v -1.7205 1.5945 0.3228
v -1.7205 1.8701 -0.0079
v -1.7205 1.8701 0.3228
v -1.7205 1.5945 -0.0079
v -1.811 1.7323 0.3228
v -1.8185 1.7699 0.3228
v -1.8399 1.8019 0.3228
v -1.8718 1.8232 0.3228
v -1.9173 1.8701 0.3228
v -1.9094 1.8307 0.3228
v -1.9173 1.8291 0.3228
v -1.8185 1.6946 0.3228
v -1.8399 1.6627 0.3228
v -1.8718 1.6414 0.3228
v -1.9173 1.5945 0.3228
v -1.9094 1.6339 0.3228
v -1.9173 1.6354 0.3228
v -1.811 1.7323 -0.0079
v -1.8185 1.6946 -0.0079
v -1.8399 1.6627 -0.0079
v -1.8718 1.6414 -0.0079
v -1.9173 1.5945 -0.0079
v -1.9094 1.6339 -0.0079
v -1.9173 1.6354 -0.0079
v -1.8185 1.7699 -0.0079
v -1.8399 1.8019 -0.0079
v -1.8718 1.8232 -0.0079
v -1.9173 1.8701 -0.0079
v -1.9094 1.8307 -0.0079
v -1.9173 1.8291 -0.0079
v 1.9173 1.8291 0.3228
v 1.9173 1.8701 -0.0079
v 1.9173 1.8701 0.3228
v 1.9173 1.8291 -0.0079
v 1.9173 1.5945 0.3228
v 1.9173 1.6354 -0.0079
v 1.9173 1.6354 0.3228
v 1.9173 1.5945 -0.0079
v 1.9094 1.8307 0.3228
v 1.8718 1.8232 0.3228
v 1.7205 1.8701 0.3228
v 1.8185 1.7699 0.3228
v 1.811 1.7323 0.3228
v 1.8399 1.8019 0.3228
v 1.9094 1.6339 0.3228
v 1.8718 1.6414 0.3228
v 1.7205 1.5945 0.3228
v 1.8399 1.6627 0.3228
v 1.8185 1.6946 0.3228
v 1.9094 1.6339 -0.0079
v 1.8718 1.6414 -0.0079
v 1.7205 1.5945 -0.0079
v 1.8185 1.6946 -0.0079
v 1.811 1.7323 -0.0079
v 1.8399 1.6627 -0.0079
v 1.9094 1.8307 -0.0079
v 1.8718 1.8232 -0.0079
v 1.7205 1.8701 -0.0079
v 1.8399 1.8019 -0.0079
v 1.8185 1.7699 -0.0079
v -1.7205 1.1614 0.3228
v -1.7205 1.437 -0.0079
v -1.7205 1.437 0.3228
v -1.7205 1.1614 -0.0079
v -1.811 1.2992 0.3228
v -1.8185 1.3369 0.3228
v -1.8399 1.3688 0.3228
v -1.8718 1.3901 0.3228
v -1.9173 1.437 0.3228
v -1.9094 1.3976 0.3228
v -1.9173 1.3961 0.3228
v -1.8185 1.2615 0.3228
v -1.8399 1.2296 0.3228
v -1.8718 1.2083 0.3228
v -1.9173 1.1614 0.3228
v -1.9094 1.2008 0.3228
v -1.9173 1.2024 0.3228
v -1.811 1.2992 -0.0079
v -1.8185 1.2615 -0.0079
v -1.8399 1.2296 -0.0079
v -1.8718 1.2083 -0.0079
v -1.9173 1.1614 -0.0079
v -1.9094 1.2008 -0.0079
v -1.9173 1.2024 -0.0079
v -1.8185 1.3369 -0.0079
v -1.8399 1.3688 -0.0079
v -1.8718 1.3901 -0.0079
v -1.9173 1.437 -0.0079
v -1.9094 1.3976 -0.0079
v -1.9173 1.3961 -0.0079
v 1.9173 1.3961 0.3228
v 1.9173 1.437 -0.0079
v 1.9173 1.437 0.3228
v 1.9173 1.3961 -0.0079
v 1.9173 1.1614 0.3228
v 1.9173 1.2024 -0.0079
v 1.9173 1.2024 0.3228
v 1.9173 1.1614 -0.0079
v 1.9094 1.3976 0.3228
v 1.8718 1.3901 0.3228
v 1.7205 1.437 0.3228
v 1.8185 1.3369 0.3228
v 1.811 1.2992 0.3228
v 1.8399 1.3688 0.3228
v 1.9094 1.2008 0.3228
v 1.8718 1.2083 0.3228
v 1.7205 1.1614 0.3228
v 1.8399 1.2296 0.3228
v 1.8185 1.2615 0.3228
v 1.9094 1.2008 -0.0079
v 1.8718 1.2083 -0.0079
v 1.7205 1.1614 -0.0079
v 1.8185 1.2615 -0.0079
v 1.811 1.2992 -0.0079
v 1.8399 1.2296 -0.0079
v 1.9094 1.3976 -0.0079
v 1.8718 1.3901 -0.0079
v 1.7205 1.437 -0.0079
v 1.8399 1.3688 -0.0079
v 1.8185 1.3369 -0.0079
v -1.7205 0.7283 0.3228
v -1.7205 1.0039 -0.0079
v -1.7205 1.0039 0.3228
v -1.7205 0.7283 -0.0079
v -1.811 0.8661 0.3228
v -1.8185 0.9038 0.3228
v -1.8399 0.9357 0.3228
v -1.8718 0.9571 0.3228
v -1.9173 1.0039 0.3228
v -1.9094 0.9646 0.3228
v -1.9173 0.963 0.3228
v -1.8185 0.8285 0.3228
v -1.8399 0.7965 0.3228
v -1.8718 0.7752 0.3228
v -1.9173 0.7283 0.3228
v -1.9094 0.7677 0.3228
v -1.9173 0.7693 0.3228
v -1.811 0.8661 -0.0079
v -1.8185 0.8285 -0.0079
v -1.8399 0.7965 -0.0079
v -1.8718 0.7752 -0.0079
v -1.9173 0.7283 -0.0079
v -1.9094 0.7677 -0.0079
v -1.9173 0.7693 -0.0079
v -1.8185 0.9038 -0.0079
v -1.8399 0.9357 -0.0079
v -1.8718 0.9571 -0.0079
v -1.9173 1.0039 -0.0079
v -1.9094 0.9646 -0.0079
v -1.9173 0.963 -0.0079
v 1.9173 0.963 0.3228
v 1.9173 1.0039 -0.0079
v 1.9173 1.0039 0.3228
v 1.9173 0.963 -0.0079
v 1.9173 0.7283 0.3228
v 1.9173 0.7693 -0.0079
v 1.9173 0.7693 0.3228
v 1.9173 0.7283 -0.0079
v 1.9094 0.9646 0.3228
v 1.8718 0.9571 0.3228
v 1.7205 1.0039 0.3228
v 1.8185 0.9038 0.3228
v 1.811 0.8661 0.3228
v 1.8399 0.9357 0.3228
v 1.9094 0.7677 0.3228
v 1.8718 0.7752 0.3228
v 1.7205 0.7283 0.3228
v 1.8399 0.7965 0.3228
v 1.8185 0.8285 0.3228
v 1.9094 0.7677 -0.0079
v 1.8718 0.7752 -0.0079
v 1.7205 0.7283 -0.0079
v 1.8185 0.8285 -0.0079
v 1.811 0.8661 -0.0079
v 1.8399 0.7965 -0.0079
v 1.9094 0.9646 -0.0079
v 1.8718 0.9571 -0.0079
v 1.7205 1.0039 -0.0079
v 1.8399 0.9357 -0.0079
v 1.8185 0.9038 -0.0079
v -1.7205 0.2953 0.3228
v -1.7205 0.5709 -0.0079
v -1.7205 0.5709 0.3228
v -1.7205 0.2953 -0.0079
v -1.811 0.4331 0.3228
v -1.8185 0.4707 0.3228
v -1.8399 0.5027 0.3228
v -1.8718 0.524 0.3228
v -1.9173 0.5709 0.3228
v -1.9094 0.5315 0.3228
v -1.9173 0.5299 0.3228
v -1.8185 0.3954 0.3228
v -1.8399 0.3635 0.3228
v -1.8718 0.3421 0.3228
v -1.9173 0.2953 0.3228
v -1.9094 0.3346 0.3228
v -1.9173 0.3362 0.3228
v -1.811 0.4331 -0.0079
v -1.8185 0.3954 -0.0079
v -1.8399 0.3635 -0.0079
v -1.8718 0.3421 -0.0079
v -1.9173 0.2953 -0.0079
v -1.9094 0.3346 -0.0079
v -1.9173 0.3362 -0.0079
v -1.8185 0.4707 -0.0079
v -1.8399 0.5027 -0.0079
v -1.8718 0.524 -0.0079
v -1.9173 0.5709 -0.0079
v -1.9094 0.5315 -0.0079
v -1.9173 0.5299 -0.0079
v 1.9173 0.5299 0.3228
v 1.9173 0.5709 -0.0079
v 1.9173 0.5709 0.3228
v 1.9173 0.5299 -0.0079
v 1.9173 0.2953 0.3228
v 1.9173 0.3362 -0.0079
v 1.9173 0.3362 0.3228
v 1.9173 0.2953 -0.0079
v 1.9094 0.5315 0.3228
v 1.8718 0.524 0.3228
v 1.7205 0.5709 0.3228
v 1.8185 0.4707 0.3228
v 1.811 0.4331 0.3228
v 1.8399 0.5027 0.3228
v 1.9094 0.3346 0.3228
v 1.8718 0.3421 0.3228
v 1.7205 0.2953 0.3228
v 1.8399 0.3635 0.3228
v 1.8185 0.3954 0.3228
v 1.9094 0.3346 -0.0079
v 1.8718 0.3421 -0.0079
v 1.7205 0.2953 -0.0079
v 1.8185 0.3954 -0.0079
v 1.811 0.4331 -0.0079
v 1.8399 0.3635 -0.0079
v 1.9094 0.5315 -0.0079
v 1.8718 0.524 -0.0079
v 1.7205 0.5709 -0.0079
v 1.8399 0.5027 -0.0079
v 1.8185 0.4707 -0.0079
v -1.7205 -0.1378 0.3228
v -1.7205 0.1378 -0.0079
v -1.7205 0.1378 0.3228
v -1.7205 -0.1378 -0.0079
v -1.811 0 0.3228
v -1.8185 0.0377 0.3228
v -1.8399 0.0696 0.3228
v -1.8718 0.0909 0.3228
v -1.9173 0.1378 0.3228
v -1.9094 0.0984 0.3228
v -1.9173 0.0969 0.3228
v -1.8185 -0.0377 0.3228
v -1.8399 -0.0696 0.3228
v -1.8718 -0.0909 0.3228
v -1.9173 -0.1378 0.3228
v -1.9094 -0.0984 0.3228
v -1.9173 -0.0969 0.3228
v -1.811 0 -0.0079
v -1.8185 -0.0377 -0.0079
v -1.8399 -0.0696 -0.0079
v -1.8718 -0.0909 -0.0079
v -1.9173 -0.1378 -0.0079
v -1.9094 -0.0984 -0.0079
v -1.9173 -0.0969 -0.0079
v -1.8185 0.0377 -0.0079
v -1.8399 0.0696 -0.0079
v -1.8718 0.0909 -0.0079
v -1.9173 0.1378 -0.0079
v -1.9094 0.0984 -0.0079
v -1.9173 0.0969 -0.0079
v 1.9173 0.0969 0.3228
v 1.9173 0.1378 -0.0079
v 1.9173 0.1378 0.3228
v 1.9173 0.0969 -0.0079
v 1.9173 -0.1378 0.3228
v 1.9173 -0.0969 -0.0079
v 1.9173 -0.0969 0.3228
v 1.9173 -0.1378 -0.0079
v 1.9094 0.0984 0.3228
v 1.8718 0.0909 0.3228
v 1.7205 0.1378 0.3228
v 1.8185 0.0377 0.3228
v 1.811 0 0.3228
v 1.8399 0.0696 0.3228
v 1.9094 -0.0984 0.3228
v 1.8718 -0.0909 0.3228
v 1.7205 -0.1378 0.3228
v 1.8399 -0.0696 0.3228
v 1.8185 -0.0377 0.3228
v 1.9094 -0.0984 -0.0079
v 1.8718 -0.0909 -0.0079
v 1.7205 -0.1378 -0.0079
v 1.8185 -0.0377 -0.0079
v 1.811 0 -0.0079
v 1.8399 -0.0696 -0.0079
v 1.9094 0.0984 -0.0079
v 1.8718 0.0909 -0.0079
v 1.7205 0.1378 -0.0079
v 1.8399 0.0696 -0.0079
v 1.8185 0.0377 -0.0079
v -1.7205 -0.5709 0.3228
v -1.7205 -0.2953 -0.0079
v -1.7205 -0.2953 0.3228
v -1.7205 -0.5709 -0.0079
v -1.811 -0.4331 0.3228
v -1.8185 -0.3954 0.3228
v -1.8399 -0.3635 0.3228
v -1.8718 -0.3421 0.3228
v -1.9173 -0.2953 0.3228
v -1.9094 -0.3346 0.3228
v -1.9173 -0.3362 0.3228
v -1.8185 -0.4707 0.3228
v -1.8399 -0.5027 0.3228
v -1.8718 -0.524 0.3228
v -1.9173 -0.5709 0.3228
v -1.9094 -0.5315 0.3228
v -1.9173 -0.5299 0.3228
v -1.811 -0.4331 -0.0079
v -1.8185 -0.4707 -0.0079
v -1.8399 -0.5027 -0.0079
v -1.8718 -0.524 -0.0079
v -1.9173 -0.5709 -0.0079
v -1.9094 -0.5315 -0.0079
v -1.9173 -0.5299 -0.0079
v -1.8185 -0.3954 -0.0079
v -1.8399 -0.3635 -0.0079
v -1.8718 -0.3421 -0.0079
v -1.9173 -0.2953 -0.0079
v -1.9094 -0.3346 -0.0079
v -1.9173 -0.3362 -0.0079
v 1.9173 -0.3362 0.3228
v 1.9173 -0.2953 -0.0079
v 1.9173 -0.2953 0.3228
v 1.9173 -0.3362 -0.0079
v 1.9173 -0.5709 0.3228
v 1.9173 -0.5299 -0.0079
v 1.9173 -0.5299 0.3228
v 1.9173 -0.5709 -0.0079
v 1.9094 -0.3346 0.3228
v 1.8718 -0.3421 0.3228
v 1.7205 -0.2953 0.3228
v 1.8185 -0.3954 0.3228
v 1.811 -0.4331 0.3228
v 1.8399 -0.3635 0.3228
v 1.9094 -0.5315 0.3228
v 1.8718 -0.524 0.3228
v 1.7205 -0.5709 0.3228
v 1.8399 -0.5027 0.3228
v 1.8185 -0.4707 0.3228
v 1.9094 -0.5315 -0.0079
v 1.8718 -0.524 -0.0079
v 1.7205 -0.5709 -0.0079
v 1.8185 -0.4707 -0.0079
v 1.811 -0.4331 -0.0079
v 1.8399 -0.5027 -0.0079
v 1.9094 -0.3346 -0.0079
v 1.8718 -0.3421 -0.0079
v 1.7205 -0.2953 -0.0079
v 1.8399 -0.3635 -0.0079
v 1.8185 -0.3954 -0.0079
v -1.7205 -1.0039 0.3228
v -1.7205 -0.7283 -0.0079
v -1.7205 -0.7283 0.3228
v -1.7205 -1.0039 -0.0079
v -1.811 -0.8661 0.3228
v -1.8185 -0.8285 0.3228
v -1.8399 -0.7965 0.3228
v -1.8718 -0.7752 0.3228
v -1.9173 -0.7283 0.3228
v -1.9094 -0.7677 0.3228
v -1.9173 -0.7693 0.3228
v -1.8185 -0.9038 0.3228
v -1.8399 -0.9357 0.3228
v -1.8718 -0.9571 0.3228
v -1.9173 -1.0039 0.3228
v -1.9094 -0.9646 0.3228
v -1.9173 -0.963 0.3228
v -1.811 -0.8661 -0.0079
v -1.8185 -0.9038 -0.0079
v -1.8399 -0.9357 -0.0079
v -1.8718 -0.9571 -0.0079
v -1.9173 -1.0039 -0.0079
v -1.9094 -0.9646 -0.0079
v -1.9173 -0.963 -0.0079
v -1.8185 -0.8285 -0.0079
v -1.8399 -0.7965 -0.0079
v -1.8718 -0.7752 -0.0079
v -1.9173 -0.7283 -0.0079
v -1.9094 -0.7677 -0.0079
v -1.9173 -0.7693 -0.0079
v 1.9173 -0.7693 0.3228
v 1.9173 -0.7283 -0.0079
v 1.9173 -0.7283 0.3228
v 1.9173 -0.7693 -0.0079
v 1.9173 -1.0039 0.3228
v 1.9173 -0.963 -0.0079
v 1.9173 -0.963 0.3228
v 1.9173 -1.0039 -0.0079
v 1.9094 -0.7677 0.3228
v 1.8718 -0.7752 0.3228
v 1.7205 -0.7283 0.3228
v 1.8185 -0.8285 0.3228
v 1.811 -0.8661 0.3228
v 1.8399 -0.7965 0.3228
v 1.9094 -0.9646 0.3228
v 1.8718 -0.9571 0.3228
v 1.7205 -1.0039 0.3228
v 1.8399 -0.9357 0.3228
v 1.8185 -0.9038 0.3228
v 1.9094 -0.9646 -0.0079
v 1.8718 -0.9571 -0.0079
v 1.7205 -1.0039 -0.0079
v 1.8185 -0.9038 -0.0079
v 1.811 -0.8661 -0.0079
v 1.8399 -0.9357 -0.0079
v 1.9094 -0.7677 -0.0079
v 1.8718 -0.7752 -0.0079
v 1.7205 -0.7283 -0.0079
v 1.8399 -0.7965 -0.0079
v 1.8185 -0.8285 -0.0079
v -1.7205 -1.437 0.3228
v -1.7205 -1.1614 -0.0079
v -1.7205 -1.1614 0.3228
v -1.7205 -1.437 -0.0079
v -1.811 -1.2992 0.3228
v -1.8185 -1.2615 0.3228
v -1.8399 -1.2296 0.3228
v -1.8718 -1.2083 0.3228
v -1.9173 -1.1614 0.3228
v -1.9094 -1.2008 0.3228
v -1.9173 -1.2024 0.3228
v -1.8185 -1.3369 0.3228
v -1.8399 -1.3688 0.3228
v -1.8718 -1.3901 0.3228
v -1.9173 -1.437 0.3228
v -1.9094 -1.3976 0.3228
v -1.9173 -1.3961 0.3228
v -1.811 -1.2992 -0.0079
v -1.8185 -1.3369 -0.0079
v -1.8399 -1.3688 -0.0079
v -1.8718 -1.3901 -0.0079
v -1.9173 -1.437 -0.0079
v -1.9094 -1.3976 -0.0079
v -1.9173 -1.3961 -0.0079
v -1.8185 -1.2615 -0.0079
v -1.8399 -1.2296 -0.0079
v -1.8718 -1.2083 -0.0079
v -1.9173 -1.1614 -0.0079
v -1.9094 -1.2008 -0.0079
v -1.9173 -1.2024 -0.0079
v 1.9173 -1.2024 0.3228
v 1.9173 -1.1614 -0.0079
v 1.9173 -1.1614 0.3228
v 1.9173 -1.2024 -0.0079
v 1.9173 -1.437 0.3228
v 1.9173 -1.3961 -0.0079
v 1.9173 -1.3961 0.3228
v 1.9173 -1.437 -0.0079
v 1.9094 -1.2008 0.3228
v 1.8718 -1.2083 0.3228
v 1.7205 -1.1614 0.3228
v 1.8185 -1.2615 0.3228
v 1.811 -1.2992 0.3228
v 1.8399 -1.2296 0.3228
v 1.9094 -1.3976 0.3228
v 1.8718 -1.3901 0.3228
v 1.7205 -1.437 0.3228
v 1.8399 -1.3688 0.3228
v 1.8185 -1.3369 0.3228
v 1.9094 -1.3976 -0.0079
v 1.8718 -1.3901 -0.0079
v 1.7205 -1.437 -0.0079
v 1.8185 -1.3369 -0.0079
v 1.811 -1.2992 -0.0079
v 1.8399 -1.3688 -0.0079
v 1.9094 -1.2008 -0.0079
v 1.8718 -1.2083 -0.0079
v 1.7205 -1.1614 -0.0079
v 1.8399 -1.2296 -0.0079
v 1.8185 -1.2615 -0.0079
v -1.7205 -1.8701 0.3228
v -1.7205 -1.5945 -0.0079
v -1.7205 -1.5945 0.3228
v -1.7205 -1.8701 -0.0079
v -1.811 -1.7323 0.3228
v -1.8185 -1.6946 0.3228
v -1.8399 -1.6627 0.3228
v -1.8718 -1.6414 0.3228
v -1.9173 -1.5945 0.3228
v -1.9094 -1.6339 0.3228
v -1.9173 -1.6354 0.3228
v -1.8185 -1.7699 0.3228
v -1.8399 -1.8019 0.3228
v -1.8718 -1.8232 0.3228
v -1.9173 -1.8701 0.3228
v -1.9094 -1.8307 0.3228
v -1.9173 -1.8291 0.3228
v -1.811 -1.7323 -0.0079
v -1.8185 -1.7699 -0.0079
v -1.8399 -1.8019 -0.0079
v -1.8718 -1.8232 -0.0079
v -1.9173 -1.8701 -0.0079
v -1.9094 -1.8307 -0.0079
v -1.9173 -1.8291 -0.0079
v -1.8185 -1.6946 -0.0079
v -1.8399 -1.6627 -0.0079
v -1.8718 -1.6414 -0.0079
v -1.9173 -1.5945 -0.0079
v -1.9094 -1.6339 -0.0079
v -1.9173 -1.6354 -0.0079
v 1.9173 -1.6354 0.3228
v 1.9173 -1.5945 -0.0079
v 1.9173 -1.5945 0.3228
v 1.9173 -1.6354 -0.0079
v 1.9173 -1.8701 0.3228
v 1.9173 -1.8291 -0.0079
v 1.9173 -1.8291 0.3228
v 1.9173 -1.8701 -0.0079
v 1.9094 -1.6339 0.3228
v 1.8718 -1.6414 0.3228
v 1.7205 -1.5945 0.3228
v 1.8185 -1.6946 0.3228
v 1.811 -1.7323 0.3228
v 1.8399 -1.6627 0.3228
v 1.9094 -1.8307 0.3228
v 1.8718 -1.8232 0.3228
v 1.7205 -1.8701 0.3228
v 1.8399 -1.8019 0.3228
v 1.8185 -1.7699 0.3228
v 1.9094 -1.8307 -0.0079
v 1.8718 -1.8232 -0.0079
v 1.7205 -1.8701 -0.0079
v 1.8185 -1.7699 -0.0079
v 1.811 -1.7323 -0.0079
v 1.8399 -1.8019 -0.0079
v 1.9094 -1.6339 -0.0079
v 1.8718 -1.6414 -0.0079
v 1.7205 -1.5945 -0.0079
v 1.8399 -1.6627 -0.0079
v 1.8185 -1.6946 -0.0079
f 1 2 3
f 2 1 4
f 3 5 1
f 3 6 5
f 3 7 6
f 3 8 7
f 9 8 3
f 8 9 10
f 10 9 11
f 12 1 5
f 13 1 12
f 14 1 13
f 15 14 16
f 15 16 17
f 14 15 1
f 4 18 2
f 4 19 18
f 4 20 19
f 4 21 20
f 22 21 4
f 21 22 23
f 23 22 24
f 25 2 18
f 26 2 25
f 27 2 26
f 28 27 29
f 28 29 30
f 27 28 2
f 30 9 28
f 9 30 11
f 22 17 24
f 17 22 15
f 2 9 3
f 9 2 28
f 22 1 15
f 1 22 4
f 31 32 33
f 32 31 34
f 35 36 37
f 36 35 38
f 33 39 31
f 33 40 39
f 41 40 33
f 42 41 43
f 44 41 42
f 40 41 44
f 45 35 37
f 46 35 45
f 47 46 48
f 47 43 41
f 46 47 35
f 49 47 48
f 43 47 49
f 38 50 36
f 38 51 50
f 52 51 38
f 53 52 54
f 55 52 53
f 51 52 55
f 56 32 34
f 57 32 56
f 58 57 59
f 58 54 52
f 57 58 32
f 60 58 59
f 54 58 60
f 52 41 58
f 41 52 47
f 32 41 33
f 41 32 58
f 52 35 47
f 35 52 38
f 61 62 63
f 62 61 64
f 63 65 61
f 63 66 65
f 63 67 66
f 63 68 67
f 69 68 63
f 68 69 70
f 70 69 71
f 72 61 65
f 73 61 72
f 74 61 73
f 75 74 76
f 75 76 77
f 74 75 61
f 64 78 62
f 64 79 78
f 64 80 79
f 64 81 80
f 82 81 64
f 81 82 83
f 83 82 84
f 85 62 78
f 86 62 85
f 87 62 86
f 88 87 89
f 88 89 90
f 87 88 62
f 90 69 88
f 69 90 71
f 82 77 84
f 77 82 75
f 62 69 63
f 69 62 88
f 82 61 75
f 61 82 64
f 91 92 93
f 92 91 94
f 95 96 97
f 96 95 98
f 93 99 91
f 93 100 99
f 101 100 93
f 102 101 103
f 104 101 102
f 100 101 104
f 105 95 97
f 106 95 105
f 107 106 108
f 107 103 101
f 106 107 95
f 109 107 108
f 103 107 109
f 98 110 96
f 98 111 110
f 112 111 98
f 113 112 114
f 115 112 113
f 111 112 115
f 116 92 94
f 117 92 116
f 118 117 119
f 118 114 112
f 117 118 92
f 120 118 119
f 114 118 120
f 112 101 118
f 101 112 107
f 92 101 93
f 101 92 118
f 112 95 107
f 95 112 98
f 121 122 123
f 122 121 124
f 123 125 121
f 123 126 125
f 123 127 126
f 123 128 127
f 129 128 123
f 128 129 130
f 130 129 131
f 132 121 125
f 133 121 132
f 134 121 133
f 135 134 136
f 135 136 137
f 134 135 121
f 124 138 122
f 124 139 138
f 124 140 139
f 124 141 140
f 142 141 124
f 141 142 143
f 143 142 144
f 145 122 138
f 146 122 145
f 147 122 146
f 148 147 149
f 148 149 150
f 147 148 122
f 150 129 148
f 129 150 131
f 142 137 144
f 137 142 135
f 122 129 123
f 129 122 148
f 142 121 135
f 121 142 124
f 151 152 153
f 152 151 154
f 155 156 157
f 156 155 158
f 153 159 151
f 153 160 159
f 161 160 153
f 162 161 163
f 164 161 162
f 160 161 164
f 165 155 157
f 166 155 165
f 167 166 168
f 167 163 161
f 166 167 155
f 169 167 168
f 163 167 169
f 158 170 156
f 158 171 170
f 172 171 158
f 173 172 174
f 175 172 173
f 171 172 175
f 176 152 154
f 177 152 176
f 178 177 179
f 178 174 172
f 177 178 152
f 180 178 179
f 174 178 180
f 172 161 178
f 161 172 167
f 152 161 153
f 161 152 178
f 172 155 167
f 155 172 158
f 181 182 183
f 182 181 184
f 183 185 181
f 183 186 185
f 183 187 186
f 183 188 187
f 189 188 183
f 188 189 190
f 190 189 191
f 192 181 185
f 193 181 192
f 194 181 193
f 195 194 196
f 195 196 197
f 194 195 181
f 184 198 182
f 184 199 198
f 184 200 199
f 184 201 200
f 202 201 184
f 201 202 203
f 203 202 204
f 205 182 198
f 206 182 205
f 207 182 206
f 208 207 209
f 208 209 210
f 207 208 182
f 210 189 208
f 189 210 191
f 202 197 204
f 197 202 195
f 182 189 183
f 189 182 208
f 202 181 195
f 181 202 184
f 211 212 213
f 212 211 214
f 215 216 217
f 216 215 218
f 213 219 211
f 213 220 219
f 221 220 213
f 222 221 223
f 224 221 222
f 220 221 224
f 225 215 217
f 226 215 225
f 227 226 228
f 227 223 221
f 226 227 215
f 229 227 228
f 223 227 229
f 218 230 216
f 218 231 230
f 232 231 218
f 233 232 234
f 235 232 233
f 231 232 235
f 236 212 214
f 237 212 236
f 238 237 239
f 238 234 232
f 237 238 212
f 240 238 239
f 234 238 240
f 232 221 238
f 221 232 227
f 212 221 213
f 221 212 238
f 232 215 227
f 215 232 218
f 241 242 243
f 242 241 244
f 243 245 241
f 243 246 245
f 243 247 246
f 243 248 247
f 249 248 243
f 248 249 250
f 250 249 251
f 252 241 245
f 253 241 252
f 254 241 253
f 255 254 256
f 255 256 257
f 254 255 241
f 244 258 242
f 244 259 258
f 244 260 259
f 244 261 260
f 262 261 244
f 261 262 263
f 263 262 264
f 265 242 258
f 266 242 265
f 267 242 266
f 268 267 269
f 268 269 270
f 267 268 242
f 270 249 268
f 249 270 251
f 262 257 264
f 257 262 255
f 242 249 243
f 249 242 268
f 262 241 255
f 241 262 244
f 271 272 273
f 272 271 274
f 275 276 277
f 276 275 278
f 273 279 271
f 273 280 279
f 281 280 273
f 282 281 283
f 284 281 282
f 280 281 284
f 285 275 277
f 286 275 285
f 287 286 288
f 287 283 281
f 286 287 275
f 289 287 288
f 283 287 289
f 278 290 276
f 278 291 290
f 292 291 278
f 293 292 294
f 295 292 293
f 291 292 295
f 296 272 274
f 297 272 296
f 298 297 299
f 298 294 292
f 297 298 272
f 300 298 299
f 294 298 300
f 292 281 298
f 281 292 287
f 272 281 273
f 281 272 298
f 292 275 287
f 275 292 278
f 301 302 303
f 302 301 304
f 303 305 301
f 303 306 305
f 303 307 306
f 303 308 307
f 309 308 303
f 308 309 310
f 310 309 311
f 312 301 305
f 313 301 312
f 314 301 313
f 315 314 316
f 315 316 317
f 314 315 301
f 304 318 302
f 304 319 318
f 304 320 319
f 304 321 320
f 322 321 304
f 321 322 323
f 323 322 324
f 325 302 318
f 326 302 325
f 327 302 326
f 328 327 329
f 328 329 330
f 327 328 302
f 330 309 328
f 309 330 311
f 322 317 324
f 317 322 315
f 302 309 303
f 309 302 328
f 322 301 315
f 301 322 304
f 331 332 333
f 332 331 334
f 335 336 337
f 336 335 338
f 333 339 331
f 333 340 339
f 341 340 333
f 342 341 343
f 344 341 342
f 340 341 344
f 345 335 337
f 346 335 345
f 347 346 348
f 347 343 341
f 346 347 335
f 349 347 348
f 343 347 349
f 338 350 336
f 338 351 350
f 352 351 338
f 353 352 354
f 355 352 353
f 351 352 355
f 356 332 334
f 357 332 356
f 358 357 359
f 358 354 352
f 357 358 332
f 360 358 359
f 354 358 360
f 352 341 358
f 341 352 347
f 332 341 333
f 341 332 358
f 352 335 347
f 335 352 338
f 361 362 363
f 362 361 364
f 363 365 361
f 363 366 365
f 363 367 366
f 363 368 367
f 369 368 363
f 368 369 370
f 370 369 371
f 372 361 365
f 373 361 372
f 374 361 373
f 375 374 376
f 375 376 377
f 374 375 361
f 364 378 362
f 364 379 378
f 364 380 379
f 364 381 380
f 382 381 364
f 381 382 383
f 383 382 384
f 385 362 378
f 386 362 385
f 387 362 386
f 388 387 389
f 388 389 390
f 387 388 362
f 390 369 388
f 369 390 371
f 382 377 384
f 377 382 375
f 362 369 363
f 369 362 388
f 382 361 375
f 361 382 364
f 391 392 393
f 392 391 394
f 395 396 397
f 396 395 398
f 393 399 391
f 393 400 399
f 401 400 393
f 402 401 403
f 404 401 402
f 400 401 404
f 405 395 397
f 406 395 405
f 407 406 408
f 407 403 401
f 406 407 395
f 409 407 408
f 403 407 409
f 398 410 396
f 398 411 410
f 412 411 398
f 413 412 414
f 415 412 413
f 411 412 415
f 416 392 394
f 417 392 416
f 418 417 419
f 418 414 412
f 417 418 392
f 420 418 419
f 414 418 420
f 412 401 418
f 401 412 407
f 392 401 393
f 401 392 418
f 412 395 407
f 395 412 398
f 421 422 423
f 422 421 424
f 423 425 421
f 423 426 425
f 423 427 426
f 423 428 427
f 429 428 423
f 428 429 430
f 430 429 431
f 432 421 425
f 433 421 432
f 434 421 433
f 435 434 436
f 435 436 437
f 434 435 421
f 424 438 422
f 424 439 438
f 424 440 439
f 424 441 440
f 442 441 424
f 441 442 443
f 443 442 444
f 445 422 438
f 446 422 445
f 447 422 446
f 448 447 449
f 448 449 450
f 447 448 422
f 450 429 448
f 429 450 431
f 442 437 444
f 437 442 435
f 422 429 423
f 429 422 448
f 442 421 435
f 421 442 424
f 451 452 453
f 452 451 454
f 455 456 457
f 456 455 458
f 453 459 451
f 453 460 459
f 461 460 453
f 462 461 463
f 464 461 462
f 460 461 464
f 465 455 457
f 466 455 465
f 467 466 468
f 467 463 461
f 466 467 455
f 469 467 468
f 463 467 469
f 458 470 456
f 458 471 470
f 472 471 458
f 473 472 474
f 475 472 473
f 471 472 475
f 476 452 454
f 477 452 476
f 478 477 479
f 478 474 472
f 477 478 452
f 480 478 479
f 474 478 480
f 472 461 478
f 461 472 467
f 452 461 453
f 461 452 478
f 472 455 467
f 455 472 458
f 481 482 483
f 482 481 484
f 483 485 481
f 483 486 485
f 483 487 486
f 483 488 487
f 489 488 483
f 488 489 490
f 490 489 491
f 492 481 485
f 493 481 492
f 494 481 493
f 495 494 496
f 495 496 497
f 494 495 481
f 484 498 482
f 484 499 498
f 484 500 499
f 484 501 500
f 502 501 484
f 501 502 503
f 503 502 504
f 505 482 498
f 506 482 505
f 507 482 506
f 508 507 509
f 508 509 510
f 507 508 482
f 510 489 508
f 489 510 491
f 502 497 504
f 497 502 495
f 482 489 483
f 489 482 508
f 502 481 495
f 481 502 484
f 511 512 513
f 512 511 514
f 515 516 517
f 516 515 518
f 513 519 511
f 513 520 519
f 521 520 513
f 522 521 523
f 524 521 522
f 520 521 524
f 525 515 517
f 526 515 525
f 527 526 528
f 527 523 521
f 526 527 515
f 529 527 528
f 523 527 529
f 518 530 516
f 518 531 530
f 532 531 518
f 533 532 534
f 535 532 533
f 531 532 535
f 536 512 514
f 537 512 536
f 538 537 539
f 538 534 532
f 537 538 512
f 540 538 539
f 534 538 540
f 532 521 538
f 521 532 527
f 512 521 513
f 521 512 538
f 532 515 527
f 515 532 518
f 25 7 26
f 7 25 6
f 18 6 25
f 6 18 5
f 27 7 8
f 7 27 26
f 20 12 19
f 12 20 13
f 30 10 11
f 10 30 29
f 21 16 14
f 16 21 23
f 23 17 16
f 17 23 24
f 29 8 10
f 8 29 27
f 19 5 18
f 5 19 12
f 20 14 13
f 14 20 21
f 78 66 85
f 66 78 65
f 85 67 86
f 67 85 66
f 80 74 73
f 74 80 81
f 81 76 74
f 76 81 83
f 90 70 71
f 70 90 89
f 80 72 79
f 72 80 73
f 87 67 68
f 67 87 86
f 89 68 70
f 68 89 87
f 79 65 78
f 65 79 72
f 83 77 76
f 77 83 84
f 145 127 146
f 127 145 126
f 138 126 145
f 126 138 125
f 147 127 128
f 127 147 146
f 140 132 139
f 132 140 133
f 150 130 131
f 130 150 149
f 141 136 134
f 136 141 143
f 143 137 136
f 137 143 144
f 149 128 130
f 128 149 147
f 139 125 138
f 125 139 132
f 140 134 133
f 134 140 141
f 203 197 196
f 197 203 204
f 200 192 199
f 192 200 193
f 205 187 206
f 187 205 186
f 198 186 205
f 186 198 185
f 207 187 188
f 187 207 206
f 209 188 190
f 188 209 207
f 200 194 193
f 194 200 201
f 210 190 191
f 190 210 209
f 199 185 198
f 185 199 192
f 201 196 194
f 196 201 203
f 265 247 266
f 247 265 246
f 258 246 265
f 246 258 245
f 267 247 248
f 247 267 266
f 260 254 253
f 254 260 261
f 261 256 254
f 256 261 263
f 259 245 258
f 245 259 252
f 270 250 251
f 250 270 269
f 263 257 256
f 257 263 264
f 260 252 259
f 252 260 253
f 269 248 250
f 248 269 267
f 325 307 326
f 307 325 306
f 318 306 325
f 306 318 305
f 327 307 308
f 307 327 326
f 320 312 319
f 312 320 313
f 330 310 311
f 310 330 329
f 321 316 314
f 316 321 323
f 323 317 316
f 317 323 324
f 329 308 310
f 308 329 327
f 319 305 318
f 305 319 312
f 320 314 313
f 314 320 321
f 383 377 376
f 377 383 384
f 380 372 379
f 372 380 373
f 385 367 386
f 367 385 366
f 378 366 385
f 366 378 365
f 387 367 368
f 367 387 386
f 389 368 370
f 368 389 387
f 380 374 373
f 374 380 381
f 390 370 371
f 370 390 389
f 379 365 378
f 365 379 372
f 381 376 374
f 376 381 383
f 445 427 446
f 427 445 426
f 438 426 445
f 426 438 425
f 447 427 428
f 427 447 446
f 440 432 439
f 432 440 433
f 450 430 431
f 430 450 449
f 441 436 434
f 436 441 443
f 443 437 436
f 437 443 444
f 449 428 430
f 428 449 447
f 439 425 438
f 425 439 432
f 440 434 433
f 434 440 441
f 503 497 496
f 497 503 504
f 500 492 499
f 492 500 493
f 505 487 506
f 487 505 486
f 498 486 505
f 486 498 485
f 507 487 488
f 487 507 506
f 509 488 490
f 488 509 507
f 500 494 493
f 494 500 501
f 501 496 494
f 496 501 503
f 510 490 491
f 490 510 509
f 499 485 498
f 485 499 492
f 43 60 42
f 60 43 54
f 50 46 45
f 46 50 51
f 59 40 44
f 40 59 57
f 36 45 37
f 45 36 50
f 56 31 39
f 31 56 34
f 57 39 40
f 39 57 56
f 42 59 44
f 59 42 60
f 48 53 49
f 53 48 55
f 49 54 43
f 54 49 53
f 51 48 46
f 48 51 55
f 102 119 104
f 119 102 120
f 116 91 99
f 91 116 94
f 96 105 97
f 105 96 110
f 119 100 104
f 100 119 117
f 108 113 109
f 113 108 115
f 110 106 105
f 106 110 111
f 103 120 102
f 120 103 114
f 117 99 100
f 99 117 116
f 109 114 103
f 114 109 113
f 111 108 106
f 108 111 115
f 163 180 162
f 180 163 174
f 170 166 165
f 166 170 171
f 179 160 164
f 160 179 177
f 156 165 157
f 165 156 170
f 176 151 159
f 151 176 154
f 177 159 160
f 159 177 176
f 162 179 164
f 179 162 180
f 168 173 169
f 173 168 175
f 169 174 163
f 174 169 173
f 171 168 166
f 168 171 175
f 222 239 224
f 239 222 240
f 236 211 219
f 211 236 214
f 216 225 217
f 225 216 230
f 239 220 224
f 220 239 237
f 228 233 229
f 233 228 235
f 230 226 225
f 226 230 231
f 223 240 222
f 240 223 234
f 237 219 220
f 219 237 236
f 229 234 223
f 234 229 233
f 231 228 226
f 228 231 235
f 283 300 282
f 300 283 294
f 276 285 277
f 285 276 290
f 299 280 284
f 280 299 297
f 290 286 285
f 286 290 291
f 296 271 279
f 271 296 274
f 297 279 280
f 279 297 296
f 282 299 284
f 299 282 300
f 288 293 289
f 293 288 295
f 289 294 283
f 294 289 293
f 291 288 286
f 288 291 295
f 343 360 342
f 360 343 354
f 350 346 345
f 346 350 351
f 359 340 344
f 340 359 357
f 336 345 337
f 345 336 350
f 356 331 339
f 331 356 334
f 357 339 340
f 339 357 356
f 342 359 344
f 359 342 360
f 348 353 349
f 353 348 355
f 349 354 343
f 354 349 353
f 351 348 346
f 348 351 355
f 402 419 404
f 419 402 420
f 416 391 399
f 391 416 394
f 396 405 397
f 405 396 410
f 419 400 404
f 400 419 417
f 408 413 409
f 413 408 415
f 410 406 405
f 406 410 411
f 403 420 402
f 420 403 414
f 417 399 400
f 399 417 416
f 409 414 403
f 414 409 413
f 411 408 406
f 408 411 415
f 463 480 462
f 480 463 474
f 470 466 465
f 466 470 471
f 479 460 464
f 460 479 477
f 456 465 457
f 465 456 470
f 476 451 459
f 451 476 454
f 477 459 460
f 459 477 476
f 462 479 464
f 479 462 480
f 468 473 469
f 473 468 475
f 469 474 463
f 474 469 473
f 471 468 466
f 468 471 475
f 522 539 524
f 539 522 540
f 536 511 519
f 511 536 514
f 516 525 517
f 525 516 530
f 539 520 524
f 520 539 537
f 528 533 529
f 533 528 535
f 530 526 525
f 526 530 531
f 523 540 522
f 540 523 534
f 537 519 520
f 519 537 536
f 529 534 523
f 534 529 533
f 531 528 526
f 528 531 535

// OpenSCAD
// file: defines.scad
w = 9.7;
h = 10.10;
t = 2.5;
pcb_t = 0.8;
pin_fragments = 16;

scale = 1/2.54;
// main file
// example012.stl is Mblock.stl, (c) 2009 Will Langford
// licensed under the Creative Commons - GNU GPL license.
// http://www.thingiverse.com/thing:753

//import("sim800c.stl", convexity=3);

// PCB

include <defines.scad>

// Pin drill

module Pin(o_x, o_y, d_x, d_y, cnt) {
  color("Gold")
  for(i = [0 : cnt-1]) {
    translate([o_x + i * d_x, o_y + i * d_y, -0.5])
      cylinder(h = 2, r = 0.25, $fn = pin_fragments);
  }
}

module PinDrills() {
    Pin(-w/2, h/2 - 0.65, 0, -1.1, 9);
    Pin( w/2, h/2 - 0.65, 0, -1.1, 9);
}

// Combine together

scale(scale)
difference() {
  union() {
      for(i = [0 : 8]) {
        translate([-w/2-0.02, h/2 - 0.65 - 0.35 - i * 1.1, -0.02])
          cube(size = [0.5, 0.7, 0.84]);
        translate([ w/2+0.02-0.5, h/2 - 0.65 - 0.35 - i * 1.1, -0.02])
          cube(size = [0.5, 0.7, 0.84]);
      }
  }
  PinDrills();
}
